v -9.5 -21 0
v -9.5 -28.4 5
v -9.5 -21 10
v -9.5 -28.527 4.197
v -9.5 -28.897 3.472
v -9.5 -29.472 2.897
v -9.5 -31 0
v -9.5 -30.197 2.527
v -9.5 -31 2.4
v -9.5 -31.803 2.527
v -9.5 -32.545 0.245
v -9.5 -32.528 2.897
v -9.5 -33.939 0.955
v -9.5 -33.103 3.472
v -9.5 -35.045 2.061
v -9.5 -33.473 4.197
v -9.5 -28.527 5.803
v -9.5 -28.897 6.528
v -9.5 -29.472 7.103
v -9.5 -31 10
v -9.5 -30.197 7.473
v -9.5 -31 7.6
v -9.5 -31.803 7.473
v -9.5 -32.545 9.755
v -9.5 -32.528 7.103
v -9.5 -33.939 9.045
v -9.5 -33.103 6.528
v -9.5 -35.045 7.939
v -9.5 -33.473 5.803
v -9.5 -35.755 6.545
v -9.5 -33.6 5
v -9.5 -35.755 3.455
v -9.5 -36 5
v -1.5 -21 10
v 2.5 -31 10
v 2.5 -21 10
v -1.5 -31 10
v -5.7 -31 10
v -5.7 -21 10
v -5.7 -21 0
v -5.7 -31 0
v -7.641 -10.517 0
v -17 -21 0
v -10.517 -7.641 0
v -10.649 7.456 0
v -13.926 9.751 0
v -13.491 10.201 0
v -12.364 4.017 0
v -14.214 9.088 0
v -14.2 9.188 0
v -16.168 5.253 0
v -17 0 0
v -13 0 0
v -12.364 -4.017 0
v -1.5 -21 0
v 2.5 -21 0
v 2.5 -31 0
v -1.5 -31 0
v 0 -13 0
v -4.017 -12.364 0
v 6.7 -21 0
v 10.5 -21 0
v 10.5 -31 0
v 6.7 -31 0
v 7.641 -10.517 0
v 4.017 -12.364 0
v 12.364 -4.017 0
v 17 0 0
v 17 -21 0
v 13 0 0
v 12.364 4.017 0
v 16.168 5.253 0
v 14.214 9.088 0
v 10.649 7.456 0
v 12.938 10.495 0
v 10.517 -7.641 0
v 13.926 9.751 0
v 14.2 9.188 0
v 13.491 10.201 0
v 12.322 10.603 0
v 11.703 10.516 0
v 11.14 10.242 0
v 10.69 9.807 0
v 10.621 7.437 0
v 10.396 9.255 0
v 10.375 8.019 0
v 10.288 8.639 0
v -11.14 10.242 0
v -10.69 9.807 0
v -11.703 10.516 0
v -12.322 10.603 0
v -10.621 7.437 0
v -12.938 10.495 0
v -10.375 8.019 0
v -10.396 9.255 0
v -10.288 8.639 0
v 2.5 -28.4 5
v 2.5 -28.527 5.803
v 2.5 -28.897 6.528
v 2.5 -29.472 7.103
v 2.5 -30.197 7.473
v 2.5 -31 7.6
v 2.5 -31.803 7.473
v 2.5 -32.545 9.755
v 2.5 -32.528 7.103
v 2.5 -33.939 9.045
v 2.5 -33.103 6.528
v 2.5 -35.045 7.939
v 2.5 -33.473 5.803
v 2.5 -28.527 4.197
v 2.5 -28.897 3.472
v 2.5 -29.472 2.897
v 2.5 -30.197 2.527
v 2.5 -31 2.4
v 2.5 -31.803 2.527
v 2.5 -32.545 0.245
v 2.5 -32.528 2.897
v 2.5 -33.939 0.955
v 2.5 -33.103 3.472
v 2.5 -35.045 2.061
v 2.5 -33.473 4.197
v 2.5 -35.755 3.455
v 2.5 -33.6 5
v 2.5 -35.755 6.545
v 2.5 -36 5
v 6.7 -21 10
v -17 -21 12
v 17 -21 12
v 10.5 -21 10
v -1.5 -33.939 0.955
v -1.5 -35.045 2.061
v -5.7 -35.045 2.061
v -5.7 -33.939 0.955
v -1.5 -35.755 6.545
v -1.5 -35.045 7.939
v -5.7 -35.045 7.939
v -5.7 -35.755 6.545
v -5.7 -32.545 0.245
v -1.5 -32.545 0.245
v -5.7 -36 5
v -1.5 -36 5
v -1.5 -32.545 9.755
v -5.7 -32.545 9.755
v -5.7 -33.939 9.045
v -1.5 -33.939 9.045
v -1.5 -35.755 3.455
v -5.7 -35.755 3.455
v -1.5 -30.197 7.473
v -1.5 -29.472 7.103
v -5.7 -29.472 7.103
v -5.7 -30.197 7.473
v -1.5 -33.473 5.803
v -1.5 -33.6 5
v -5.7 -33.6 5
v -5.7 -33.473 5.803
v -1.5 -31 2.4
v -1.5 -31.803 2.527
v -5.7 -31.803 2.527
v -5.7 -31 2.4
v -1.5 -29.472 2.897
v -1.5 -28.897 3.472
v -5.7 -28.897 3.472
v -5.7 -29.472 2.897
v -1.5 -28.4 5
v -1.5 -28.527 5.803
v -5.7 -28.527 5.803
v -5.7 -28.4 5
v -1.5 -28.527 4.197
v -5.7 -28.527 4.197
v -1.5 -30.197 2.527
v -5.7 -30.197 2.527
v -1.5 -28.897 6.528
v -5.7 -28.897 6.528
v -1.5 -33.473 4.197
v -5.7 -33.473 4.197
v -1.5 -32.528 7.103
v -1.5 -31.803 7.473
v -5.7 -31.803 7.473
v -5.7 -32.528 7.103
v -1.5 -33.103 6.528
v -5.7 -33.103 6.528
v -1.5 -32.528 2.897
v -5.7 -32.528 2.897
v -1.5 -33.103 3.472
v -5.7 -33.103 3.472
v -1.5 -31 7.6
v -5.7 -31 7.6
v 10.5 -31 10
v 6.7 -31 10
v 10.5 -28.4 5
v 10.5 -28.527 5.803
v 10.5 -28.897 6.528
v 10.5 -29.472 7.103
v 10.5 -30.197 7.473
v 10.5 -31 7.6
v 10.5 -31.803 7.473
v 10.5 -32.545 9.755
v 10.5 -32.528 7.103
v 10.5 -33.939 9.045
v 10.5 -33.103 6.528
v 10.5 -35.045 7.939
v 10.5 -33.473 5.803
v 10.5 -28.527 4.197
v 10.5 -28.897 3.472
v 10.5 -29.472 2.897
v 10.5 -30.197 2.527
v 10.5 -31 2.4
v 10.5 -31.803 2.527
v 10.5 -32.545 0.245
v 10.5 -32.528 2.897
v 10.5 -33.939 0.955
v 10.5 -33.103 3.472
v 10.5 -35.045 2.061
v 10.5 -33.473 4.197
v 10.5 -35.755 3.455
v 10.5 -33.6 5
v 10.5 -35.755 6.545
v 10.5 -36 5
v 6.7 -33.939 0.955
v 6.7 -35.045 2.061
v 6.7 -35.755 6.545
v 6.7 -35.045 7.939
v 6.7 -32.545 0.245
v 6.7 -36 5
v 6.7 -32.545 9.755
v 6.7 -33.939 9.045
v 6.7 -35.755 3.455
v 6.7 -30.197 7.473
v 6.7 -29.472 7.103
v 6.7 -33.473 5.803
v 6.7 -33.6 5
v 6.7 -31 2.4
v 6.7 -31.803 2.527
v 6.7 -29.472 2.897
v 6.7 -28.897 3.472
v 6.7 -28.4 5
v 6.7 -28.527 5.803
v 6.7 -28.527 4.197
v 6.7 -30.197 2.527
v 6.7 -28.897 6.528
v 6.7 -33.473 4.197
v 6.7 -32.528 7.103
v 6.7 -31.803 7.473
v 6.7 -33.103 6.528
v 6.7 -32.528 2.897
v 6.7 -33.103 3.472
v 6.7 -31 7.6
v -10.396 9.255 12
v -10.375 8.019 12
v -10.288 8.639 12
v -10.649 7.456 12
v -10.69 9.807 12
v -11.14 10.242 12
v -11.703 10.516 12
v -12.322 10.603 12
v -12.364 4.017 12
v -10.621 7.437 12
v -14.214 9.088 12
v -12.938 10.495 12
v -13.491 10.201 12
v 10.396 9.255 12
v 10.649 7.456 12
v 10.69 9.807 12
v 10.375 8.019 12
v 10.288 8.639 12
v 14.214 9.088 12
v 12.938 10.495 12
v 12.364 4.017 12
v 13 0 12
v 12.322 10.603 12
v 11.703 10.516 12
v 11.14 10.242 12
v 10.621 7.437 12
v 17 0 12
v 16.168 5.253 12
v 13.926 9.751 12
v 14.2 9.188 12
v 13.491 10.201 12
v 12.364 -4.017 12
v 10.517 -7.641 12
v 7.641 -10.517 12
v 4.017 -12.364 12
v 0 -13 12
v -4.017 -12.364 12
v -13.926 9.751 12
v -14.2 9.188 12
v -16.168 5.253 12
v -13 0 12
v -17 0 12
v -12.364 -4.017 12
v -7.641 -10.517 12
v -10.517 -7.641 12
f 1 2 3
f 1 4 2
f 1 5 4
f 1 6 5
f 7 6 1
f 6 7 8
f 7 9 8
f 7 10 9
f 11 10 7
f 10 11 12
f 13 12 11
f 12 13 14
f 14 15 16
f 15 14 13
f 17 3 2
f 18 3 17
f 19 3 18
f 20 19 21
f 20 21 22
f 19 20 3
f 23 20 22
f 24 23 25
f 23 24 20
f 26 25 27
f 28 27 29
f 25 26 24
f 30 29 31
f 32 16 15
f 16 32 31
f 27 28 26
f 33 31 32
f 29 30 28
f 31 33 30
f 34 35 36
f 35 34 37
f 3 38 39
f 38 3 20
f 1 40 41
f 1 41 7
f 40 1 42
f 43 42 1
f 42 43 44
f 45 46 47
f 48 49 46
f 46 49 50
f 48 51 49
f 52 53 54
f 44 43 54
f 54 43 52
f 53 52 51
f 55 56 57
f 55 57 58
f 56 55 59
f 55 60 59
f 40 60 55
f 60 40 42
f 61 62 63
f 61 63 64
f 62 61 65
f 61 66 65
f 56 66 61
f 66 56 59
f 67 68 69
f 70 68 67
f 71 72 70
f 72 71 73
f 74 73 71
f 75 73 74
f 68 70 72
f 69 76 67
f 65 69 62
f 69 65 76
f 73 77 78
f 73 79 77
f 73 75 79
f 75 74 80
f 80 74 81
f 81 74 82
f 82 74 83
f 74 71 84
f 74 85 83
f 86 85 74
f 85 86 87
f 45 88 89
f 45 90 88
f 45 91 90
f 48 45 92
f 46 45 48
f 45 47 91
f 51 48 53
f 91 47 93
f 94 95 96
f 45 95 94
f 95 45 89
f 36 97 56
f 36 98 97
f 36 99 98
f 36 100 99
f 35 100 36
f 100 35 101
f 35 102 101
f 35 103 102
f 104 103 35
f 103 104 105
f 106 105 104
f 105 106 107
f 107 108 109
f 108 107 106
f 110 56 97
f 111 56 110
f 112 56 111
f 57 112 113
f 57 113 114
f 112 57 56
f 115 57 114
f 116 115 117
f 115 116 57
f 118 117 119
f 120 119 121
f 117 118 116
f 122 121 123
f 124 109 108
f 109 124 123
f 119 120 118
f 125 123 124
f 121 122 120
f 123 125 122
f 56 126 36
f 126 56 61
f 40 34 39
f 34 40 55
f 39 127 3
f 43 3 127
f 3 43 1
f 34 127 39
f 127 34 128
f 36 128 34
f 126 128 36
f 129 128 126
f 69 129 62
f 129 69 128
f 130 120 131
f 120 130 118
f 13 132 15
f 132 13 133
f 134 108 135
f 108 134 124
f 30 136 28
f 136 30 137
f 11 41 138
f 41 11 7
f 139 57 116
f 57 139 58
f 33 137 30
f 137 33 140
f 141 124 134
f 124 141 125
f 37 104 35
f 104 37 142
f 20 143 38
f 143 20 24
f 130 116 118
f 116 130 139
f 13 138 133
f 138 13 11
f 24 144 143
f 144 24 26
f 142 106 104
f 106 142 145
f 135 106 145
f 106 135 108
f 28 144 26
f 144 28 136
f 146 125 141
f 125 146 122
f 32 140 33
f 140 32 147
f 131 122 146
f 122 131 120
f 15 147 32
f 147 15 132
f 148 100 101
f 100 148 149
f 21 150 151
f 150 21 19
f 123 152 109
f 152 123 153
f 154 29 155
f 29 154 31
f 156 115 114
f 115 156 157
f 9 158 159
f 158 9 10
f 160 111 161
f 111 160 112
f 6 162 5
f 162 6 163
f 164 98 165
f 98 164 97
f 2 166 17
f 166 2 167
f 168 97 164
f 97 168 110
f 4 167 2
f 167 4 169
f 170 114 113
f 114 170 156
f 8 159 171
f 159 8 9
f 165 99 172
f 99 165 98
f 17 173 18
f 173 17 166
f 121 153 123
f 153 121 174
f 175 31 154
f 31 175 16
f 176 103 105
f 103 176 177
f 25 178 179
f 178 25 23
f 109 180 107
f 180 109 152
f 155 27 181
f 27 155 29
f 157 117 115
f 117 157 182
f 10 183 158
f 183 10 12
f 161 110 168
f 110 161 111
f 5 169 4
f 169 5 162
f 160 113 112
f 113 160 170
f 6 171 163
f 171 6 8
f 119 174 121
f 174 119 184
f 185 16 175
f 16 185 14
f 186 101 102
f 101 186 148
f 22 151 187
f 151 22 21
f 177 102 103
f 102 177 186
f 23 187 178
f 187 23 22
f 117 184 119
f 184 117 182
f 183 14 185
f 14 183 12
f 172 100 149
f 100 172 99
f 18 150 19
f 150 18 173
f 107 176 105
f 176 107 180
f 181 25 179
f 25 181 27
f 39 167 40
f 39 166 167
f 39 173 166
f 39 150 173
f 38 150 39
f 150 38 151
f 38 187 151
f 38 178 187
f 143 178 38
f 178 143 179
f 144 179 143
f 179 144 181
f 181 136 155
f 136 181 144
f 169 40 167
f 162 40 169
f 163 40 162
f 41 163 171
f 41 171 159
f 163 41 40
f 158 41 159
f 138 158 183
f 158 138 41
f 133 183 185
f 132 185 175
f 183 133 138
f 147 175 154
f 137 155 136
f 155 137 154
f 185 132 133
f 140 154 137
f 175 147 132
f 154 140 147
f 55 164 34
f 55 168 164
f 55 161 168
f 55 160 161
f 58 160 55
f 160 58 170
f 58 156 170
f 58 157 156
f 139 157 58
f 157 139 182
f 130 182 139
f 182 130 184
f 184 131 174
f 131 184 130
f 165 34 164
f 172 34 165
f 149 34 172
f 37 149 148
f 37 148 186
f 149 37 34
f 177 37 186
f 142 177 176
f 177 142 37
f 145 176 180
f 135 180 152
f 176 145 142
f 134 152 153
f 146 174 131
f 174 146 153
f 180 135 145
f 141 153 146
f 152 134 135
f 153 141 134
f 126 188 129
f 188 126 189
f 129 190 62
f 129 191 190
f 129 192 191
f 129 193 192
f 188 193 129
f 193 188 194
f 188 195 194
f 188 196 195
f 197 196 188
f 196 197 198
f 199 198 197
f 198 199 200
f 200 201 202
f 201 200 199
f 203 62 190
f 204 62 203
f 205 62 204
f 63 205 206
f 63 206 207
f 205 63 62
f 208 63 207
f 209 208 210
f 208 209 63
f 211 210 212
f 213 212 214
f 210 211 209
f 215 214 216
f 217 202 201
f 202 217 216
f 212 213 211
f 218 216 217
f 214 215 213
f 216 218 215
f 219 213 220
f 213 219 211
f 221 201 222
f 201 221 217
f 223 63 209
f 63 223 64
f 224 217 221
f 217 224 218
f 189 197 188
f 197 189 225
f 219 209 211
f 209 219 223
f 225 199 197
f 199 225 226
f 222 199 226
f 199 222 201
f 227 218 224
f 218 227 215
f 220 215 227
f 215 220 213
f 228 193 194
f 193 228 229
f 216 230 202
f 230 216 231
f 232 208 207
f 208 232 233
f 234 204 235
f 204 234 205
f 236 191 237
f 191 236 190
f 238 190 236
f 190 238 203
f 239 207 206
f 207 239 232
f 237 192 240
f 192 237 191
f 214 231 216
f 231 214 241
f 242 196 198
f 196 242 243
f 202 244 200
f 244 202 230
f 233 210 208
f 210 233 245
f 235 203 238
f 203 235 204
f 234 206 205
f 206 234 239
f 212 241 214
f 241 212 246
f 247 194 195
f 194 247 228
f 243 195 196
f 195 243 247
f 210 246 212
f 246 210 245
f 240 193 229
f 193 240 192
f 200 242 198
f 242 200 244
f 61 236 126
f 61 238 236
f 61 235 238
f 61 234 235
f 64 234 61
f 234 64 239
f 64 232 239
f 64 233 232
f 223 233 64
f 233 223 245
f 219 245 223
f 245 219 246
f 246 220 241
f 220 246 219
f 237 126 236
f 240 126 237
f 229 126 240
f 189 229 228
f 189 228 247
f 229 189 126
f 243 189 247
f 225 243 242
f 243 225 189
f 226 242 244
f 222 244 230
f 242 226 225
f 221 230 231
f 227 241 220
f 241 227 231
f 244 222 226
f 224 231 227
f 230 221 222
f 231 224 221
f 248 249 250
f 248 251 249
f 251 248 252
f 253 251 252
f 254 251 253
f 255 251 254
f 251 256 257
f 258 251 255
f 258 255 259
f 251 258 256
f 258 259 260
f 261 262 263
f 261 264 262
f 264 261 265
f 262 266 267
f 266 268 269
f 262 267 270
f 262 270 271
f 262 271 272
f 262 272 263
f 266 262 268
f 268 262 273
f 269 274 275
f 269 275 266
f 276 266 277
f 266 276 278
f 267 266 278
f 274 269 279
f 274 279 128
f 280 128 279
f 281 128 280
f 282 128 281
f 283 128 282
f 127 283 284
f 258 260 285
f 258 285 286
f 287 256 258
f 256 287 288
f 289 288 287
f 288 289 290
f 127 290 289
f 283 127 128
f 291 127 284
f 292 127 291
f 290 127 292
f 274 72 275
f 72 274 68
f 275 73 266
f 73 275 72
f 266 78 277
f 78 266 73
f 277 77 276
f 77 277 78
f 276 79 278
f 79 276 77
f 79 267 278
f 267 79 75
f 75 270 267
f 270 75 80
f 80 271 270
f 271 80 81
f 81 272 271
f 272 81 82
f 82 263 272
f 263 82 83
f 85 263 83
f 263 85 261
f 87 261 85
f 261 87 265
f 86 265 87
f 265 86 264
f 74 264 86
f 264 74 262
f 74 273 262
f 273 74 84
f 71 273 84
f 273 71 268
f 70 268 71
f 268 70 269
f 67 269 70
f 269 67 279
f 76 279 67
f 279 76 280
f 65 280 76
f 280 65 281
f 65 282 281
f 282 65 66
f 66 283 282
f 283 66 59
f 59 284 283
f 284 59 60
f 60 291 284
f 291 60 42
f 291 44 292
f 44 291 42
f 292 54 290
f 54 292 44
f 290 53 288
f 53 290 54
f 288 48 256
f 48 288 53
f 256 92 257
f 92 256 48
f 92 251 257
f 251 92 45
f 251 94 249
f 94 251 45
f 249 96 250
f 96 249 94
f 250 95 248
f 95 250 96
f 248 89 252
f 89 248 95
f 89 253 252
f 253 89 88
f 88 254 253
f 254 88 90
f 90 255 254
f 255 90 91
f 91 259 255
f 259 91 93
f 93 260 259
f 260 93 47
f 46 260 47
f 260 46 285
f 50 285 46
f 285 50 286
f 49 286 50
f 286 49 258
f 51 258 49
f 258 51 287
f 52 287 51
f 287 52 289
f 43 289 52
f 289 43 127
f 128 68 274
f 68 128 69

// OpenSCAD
// file: spresenseBox.scad
//---------------------------------------------------------
//  Uses YAPP (Yet Another Parameterized Projectbox) generator
//
//  This is a box for Sony Spresense with LTE extension board and camera
//
//  Version 1.0 (2022-07-01)
//---------------------------------------------------------
include <lib/YAPPgenerator_v14.scad>

printBaseShell      = true;
printLidShell       = true;

wallThickness       = 1.3;
basePlaneThickness  = 1.3;
lidPlaneThickness   = 1.3;

baseWallHeight      = 13;
lidWallHeight       = 20;

// Total height of box = basePlaneThickness + lidPlaneThickness 
//                     + baseWallHeight + lidWallHeight
pcbLength           = 50;
pcbWidth            = 45;
pcbThickness        = 1.5;
                            
// padding between pcb and inside wall
paddingFront        = 6.0;
paddingBack         = 2.0;
paddingRight        = 2.0;
paddingLeft         = 2.0;

// ridge where base and lid off box can overlap
// Make sure this isn't less than lidWallHeight
ridgeHeight         = 3;
ridgeSlack          = 0.2;

roundRadius         = 2.0;

// How much the PCB needs to be raised from the base
// to leave room for solderings and whatnot
standoffHeight      = 11.0;
pinDiameter         = 1.6;
pinHoleSlack        = 0.1;
standoffDiameter    = 4;


//-- D E B U G -------------------
showSideBySide      = true;
hideLidWalls        = false;
onLidGap            = 6;
shiftLid            = 10;
colorLid            = "yellow";
hideBaseWalls       = false;
colorBase           = "white";
showPCB             = false;
showMarkers         = true;
inspectX            = 0;  // 0=none, >0 from front, <0 from back
inspectY            = 0;  // 0=none, >0 from left, <0 from right


//-- pcb_standoffs  -- origin is pcb[0,0,0]
// (0) = posx
// (1) = posy
// (2) = { yappBoth | yappLidOnly | yappBaseOnly }
// (3) = { yappHole, YappPin }
pcbStands = [
                [1,           1,          yappBoth, yappPin] 
               ,[11,  pcbWidth-3,          yappBoth, yappPin]
               ,[pcbLength-3, 1,          yappBoth, yappPin]
               ,[pcbLength-3, pcbWidth-3, yappBoth, yappPin]
             ];     

//-- Lid plane    -- origin is pcb[0,0,0]
// (0) = posx
// (1) = posy
// (2) = width
// (3) = length
// (4) = angle
// (5) = { yappRectangle | yappCircle }
// (6) = { yappCenter }
cutoutsLid =  [
                  [(pcbWidth/2)+6,  (pcbWidth/2), 8, 8, 0, yappCircle, yappCenter]         // lens
                //, [9,  ((pcbWidth/2)+0.5), 9, 20, 0, yappCircle]         // lens
                //, [10, ((pcbWidth/2)+0.5), 9, 20, 0, yappCircle]         // lens
                //, [30, pcbWidth-3, 6, 6, 0, yappRectangle, yappCenter]   // flash LED
              ];

//-- base plane    -- origin is pcb[0,0,0]
// (0) = posx
// (1) = posy
// (2) = width
// (3) = length
// (4) = angle
// (5) = { yappRectangle | yappCircle }
// (6) = { yappCenter }
cutoutsBase =   [
                    [13, (pcbWidth/2)-7,  6, 1.5, 25, yappRectangle]
                  , [17, (pcbWidth/2)-7, 15, 1.5, 25, yappRectangle]
                  , [21, (pcbWidth/2)-7, 15, 1.5, 25, yappRectangle]
                  , [25, (pcbWidth/2)-7, 15, 1.5, 25, yappRectangle]
                  , [29, (pcbWidth/2)-7, 15, 1.5, 25, yappRectangle]
                  , [29, (pcbWidth/2)+0,  6, 1.5, 25, yappRectangle]
                ];

//-- front plane  -- origin is pcb[0,0,0]
// (0) = posy
// (1) = posz
// (2) = width
// (3) = height
// (4) = angle
// (5) = { yappRectangle | yappCircle }
// (6) = { yappCenter }
cutoutsFront =  [
                ];

//-- back plane  -- origin is pcb[0,0,0]
// (0) = posy
// (1) = posz
// (2) = width
// (3) = height
// (4) = angle
// (5) = { yappRectangle | yappCircle }
// (6) = { yappCenter }
cutoutsBack =   [
                ];

//-- left plane   -- origin is pcb[0,0,0]
// (0) = posx
// (1) = posz
// (2) = width
// (3) = height
// (4) = angle
// (5) = { yappRectangle | yappCircle }
// (6) = { yappCenter }
cutoutsLeft =   [
                    [11, 3, 15, 10, 0, yappRectangle, yappCenter] // SD card
                ];

//-- right plane   -- origin is pcb[0,0,0]
// (0) = posx
// (1) = posz
// (2) = width
// (3) = height
// (4) = angle
// (5) = { yappRectangle | yappCircle }
// (6) = { yappCenter }
cutoutsRight =  [
                    //[shellLength-13, -7, 4, 6.5, 0, yappRectangle] // power cord
                ];

//-- connectors -- origen = box[0,0,0]
// (0) = posx
// (1) = posy
// (2) = screwDiameter
// (3) = insertDiameter
// (4) = outsideDiameter
// (5) = { yappAllCorners }
connectors   =  [
                 //   [8, 8, 2.5, 3.8, 5, yappAllCorners]
                 // , [30, 8, 5, 5, 5]
                ];

//-- base mounts -- origen = box[x0,y0]
// (0) = posx | posy
// (1) = screwDiameter
// (2) = width
// (3) = height
// (4..7) = yappLeft / yappRight / yappFront / yappBack (one or more)
// (5) = { yappCenter }
baseMounts   = [
               ];

//-- snap Joins -- origen = box[x0,y0]
// (0) = posx | posy
// (1) = width
// (2..5) = yappLeft / yappRight / yappFront / yappBack (one or more)
// (n) = { yappSymmetric }
snapJoins   =     [
                    [25, 5, yappLeft],
                    [2, 5, yappRight],
                  , [(shellWidth/2)-2.5, 5, yappFront]
                ];
               
//-- origin of labels is box [0,0,0]
// (0) = posx
// (1) = posy/z
// (2) = orientation
// (3) = plane {lid | base | left | right | front | back }
// (4) = font
// (5) = size
// (6) = "label text"
labelsPlane =  [
               ];
               
module baseHookOutside()
{
  translate([(shellLength/2)-6,shellWidth-wallThickness,0])
  {
    difference()
    {
      union()
      {
        cube([12,10,10]);
        translate([0,10,5])
          rotate([0,90,0])
            cylinder(d=10, h=12);
      }
      translate([-1,10,5])
      {
        rotate([0,90,0])
          color("red") cylinder(d=5.2, h=17);
      }
      translate([3.8,0,-0.5])
        cube([4.4,16,11]);
    }
  
  } // translate
  
} //  baseHook()

module lidHookInside()
{
  
  translate([(pcbWidth/2)+22, (pcbWidth/2)-7, -lidPlaneThickness])
  rotate([-180, 0, 180]) {
      cylinder(6, d=2.2, true);
      cylinder(4, d=4, true);
     
      translate([12.5, 0, 0]) {
         cylinder(6, d=2.2, true);
         cylinder(4, d=4, true);
      }
      
      translate([12.5, 21, 0]) {
         cylinder(6, d=2.2, true);
         cylinder(4, d=4, true);
      }
      
      translate([0, 21, 0]) {
         cylinder(6, d=2.2, true);
         cylinder(4, d=4, true);
      }
  }
} //  lidHookInside()

//---- This is where the magic happens ----
YAPPgenerate();
// main file
// click & clamp

use <./spresenseBox.scad>;

$fn=20;

pipe_diameter=26;
pipe_radius=pipe_diameter/2;

clamp_thickness=4;

clamp_radius=pipe_radius+clamp_thickness;

screw_diameter=4;
screw_radius=screw_diameter/2;

screw_head_diameter=7;
screw_head_radius=screw_head_diameter/2;


clamp_height=12;
opening_angle=110;

difference(){
	linear_extrude(height=clamp_height){
		difference(){
			union(){
				translate([-clamp_radius,-clamp_radius-clamp_thickness,0])
					square([2*clamp_radius,clamp_radius+clamp_thickness]);
				circle(r=clamp_radius);
			}
			circle(r=pipe_radius);
			polygon(points=[	[0,0],
								[clamp_radius*cos((180-opening_angle)/2),clamp_radius*sin((180-opening_angle)/2)],
								[clamp_radius*cos((180-opening_angle)/2),clamp_radius],
								[clamp_radius*cos(90+opening_angle/2),clamp_radius],
								[clamp_radius*cos(90+opening_angle/2),clamp_radius*sin(90+opening_angle/2)]]);
		}
		rotate([0,0,(180-opening_angle)/2]) translate([pipe_radius+1/2*clamp_thickness,0,0]) circle(r=clamp_thickness/2);
		rotate([0,0,90+opening_angle/2]) translate([pipe_radius+1/2*clamp_thickness,0,0]) circle(r=clamp_thickness/2);
	}
//translate([0,0,clamp_height/2]) rotate([90,0,0]) cylinder(r=screw_radius,h=clamp_radius*2);
//translate([0,0,clamp_height/2]) rotate([90,0,0]) cylinder(r=screw_head_radius,h=clamp_radius);
}


translate([2.5,-pipe_radius-clamp_thickness-4,0])
   rotate([180, 180, 0]) {
   {
     difference()
     {
       union()
       {
         cube([12,10,10]);
         translate([0,10,5])
           rotate([0,90,0])
             cylinder(d=10, h=12);
       }
       translate([-1,10,5])
       {
         rotate([0,90,0])
           color("red") cylinder(d=5.2, h=17);
       }
       translate([3.8,0,-0.5])
         cube([4.4,16,11]);
     }
     
     translate([-8, 0 , 0]) 
     difference()
     {
       union()
       {
         cube([12,10,10]);
         translate([0,10,5])
           rotate([0,90,0])
             cylinder(d=10, h=12);
       }
       translate([-1,10,5])
       {
         rotate([0,90,0])
           color("red") cylinder(d=5.2, h=17);
       }
       translate([3.8,0,-0.5])
         cube([4.4,16,11]);
     }
   
   }
}
